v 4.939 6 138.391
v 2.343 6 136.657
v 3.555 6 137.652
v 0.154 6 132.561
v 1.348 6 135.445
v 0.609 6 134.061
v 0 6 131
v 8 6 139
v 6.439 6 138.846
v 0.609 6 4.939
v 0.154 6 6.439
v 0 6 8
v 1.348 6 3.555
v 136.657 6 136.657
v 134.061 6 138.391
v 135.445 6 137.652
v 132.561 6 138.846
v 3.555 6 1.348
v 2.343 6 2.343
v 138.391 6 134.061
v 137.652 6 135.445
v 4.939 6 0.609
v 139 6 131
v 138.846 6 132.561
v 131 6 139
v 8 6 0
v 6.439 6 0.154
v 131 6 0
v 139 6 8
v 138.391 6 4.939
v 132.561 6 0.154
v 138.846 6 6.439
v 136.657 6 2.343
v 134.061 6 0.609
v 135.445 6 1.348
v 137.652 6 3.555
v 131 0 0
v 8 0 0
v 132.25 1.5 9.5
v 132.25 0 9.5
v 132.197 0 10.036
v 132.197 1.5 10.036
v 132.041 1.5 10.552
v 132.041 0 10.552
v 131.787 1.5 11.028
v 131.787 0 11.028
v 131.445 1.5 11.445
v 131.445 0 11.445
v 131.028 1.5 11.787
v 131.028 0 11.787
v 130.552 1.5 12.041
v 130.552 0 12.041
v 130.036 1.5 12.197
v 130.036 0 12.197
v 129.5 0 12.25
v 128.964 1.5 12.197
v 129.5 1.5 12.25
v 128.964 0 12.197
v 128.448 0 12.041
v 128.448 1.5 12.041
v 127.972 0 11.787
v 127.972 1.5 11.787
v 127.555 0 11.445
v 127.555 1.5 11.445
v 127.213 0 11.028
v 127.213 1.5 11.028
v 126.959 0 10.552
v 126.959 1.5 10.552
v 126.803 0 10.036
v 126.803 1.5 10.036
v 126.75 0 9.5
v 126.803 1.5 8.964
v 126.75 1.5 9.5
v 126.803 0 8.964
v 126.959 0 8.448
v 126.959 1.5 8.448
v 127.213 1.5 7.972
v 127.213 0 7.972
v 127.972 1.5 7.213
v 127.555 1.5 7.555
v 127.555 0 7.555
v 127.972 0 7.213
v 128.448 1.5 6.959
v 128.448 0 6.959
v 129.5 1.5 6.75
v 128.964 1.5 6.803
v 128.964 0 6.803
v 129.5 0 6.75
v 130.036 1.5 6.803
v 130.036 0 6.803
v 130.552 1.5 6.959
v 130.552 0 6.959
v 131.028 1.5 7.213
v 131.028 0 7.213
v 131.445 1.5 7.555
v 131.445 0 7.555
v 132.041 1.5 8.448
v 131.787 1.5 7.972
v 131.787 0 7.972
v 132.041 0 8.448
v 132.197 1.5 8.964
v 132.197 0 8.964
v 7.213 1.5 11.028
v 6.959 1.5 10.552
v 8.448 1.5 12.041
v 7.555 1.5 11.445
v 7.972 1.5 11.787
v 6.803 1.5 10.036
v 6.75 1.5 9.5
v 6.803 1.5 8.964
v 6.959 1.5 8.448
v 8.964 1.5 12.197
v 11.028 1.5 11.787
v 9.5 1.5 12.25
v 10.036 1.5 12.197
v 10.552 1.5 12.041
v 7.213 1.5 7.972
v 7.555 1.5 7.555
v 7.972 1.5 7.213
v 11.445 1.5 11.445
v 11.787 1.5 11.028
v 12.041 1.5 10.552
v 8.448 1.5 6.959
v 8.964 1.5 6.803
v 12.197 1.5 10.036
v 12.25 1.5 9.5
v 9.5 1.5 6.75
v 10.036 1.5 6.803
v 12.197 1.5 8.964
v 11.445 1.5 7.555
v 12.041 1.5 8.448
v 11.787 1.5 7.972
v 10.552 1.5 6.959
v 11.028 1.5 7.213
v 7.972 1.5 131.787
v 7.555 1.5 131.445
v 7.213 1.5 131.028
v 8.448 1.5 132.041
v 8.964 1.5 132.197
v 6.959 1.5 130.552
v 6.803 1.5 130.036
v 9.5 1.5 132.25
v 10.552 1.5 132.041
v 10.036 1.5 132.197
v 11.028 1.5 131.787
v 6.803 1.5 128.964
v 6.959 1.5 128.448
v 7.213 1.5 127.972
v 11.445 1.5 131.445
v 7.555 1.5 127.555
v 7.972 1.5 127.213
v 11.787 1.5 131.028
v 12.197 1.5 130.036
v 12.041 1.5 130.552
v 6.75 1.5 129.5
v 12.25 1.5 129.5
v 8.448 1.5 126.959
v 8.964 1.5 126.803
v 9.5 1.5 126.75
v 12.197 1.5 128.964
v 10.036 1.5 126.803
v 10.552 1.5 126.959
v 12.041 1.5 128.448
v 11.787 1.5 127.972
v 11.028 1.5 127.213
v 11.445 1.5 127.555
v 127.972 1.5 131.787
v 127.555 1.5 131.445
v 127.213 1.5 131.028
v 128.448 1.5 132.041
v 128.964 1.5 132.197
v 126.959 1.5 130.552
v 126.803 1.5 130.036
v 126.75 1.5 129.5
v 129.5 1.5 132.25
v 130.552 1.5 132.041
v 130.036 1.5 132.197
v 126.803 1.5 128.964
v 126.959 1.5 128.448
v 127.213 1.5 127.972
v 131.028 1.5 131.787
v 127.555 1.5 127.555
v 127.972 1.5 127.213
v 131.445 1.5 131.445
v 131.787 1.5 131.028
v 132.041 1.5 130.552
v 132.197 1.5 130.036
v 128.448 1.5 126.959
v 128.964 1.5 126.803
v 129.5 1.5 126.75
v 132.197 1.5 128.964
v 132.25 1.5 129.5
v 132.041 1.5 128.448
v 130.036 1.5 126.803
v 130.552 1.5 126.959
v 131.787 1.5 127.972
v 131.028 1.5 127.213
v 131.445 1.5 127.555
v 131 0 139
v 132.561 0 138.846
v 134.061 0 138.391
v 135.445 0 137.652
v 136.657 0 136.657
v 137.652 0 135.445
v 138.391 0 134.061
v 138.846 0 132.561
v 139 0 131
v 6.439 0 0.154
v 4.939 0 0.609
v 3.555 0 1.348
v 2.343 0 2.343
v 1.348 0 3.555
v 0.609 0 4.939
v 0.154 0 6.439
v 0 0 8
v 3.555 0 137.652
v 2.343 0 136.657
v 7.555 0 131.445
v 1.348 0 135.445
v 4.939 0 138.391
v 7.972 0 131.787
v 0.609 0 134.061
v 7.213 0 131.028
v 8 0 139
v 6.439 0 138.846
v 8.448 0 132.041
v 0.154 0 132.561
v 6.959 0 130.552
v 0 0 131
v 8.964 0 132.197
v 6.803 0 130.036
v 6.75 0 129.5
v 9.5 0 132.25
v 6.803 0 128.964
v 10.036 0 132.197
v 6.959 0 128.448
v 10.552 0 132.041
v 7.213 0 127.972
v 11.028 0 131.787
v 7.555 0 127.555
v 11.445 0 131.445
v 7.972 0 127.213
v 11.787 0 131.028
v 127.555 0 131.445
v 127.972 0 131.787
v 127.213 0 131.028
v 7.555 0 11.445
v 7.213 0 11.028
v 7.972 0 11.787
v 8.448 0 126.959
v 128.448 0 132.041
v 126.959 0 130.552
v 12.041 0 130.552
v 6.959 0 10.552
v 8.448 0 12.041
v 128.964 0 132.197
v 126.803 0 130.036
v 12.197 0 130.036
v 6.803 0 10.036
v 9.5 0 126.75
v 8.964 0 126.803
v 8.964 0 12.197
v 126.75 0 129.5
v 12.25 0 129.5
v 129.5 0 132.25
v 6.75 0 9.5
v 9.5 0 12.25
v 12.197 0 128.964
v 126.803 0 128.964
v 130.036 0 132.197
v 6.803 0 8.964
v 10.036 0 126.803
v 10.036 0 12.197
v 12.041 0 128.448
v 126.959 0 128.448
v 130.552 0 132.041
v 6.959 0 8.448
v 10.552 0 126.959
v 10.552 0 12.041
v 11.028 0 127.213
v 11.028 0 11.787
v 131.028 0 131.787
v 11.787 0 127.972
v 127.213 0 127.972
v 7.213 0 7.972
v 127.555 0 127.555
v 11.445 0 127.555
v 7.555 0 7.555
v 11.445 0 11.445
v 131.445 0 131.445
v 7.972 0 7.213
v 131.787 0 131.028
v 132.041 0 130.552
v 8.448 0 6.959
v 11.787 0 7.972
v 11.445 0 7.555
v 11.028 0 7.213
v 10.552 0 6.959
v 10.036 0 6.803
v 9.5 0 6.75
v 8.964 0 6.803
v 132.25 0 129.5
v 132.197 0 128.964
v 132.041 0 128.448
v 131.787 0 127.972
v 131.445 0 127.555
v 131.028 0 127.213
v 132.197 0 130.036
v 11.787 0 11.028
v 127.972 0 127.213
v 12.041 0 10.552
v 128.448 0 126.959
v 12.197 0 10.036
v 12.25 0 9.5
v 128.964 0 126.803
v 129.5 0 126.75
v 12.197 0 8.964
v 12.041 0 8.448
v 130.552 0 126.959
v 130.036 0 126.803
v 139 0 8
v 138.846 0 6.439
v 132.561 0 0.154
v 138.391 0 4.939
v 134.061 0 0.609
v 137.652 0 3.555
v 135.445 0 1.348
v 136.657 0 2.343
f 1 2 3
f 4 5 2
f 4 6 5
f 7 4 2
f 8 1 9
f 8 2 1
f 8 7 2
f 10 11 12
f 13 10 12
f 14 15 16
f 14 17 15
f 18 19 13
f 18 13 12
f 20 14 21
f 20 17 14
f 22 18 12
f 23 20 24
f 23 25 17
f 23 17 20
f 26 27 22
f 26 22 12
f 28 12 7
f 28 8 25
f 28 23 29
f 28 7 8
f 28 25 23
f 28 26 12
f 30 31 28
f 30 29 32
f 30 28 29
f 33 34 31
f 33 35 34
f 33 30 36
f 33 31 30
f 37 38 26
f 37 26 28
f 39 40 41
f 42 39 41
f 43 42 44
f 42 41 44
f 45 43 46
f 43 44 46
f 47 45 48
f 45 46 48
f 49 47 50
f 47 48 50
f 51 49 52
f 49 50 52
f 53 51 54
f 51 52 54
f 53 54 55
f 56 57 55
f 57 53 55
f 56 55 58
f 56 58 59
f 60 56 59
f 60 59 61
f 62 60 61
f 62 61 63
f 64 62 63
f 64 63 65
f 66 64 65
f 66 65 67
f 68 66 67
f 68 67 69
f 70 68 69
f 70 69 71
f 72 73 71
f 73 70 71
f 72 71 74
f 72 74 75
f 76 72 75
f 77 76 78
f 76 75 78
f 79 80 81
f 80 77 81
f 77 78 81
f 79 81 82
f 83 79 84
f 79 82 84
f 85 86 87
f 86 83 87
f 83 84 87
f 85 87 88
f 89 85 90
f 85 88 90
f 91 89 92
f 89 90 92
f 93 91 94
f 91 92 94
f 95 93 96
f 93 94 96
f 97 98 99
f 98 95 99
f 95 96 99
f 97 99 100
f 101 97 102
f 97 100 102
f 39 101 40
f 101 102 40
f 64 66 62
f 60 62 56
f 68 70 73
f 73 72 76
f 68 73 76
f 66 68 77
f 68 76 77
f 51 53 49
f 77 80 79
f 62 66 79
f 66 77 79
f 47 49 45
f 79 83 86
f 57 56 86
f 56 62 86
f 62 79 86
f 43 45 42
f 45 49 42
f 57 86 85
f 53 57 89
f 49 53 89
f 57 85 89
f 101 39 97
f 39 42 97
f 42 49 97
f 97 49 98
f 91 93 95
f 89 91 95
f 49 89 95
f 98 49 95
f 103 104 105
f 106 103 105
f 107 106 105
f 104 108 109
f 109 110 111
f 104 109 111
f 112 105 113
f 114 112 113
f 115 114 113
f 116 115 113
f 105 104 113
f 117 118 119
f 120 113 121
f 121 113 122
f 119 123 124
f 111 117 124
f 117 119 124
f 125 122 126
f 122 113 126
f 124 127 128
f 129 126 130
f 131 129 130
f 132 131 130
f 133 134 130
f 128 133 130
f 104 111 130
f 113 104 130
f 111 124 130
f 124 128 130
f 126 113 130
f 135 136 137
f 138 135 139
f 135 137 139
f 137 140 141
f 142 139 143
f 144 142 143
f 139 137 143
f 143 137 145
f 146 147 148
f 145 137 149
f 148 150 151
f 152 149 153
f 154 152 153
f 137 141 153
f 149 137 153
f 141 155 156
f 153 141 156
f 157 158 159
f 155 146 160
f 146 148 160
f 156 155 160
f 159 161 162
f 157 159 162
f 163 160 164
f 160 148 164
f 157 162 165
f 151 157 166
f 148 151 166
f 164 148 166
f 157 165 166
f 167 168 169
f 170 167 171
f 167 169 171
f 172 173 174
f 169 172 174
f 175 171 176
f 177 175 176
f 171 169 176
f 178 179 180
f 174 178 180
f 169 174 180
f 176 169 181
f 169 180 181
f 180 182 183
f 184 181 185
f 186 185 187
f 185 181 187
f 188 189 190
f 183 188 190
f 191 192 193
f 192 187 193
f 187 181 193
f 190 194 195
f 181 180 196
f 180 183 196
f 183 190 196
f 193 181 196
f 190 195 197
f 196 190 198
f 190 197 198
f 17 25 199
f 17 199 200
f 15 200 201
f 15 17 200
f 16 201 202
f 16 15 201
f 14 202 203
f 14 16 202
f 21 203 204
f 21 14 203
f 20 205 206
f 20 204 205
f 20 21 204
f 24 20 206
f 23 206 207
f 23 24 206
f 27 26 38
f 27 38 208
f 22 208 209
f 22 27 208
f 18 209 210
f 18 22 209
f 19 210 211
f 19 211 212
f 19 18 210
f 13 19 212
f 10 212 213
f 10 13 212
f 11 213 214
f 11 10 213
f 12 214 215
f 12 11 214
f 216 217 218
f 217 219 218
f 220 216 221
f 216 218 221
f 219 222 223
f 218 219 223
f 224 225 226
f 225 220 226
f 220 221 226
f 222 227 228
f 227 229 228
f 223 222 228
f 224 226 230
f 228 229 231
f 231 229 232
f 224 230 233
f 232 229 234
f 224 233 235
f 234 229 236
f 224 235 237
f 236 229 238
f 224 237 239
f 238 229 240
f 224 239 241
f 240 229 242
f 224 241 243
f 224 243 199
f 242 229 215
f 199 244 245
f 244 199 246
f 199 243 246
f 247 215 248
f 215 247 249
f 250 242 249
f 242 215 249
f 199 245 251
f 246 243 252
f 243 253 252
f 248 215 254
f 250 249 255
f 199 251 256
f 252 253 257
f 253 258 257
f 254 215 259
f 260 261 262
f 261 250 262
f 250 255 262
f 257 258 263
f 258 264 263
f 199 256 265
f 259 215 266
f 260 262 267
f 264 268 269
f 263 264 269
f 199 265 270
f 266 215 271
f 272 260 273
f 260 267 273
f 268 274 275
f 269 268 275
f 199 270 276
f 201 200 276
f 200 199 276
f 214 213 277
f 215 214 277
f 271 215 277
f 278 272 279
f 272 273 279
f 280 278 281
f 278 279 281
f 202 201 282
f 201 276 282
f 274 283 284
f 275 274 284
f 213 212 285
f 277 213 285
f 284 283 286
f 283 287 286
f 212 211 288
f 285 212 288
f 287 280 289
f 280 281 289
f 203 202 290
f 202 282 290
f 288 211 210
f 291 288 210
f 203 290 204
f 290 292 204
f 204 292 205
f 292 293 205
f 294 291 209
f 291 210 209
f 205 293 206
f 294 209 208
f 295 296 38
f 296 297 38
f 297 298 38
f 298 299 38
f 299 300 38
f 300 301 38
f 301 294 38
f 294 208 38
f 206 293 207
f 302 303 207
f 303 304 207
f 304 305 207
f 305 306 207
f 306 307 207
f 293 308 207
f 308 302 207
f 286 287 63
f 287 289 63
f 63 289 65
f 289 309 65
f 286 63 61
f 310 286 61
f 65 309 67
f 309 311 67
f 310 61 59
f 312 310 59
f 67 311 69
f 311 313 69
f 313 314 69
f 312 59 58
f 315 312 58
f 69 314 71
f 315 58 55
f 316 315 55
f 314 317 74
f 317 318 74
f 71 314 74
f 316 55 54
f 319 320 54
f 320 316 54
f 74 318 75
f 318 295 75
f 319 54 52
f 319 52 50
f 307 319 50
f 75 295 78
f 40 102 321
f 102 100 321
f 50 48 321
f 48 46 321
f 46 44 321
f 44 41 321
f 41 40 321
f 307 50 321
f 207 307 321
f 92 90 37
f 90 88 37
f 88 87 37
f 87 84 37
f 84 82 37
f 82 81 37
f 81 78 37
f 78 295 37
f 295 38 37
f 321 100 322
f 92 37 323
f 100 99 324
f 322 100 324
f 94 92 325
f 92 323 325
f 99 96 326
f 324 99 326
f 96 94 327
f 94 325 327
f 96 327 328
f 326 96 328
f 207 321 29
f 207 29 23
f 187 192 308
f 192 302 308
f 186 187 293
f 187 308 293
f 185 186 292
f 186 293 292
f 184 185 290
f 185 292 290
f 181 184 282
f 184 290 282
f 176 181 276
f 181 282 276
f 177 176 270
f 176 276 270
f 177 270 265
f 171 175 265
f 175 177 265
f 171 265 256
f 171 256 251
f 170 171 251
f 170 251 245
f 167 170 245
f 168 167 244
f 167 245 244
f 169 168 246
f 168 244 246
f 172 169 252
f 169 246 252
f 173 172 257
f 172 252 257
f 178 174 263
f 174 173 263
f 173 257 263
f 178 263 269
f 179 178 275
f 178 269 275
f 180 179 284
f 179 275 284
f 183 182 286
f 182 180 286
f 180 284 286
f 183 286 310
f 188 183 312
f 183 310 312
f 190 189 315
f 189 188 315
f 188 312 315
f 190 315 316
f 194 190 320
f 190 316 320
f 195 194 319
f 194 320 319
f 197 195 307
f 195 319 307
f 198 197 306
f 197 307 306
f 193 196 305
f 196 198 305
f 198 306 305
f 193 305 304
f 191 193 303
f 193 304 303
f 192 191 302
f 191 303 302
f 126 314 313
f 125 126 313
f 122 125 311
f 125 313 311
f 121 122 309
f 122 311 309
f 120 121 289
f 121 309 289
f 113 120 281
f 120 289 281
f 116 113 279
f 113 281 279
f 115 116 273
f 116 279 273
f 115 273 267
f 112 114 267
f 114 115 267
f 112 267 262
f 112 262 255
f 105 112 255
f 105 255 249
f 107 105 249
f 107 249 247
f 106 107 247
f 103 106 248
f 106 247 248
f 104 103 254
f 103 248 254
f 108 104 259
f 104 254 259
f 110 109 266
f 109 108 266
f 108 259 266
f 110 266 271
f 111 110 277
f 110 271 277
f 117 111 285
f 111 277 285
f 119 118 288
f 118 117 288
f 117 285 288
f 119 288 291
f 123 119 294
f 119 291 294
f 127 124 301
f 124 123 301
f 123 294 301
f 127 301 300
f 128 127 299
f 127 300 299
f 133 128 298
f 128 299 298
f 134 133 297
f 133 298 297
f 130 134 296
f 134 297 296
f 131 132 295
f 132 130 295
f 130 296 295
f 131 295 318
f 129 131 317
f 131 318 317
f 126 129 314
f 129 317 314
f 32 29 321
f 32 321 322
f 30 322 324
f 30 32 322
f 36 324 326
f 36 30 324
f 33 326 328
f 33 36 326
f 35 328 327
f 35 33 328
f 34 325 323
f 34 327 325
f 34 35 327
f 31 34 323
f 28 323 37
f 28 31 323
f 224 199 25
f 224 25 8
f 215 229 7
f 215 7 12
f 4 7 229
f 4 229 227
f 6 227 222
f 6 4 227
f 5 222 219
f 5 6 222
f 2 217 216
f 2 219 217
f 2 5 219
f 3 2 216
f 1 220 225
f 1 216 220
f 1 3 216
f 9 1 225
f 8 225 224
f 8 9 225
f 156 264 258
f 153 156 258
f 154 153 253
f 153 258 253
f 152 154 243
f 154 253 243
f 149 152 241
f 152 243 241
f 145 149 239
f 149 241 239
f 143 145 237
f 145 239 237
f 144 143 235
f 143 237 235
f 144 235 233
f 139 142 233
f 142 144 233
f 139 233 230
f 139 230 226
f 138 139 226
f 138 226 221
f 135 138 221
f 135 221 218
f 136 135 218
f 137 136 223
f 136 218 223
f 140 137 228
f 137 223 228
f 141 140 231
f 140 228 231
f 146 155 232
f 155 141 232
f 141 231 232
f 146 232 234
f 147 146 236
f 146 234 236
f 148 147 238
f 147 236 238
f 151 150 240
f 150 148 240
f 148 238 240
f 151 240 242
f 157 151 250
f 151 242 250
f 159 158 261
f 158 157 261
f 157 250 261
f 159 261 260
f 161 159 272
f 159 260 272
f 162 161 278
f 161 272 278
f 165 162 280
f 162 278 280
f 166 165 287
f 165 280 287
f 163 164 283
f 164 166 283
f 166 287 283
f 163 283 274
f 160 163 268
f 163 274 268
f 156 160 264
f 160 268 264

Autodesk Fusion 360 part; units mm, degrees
sketch "Bottom Access Panel" plane through (0, 0, 0) normal (0, 1, 0) x (1, 0, 0)
  line L0 (0, 0) -> (139, 0)
  line L1 (139, 0) -> (139, -139)
  line L2 (139, -139) -> (0, -139)
  line L3 (0, -139) -> (0, 0)
  dimension "d1" = 139
  dimension "d2" = 139
extrude "Extrude1" add sketch "Bottom Access Panel" along normal blind 6
fillet "Fillet1" radius 8 4 edges at (0, 3, 139) (139, 3, 139) (139, 3, 0) (0, 3, 0)
sketch "Magnet Holes" plane through (0, 0, 0) normal (0, 1, 0) x (1, 0, 0)
  arc A0 (8, 0) -> (0, -8) centre (8, -8) ccw
  line L0 (8, 0) -> (131, 0)
  arc A1 (139, -8) -> (131, 0) centre (131, -8) ccw
  line L1 (139, -8) -> (139, -131)
  arc A2 (131, -139) -> (139, -131) centre (131, -131) ccw
  line L2 (131, -139) -> (8, -139)
  arc A3 (0, -131) -> (8, -139) centre (8, -131) ccw
  line L3 (0, -131) -> (0, -8)
  circle A4 centre (9.5, -129.5) radius 2.75
  circle A5 centre (129.5, -129.5) radius 2.75
  circle A6 centre (9.5, -9.5) radius 2.75
  circle A7 centre (129.5, -9.5) radius 2.75
  dimension "d20" = 5.5
  dimension "d21" = 5.5
  dimension "d22" = 5.5
  dimension "d23" = 5.5
  dimension "d24" = 9.5
  dimension "d25" = 9.5
  dimension "d26" = 9.5
  dimension "d27" = 9.5
  dimension "d28" = 9.5
  dimension "d29" = 9.5
  dimension "d30" = 9.5
  dimension "d31" = 9.5
extrude "Extrude3" cut sketch "Magnet Holes" along normal blind 1.5 contours A4 | A5 | A6 | A7
equation "mdfThickness = 6 mm" comment "Thickness of the MDF fibre board"
equation "d4 = mdfThickness"
equation "filletRadius = 8 mm" comment "Radius to use for fillets"
equation "d15 = filletRadius"
